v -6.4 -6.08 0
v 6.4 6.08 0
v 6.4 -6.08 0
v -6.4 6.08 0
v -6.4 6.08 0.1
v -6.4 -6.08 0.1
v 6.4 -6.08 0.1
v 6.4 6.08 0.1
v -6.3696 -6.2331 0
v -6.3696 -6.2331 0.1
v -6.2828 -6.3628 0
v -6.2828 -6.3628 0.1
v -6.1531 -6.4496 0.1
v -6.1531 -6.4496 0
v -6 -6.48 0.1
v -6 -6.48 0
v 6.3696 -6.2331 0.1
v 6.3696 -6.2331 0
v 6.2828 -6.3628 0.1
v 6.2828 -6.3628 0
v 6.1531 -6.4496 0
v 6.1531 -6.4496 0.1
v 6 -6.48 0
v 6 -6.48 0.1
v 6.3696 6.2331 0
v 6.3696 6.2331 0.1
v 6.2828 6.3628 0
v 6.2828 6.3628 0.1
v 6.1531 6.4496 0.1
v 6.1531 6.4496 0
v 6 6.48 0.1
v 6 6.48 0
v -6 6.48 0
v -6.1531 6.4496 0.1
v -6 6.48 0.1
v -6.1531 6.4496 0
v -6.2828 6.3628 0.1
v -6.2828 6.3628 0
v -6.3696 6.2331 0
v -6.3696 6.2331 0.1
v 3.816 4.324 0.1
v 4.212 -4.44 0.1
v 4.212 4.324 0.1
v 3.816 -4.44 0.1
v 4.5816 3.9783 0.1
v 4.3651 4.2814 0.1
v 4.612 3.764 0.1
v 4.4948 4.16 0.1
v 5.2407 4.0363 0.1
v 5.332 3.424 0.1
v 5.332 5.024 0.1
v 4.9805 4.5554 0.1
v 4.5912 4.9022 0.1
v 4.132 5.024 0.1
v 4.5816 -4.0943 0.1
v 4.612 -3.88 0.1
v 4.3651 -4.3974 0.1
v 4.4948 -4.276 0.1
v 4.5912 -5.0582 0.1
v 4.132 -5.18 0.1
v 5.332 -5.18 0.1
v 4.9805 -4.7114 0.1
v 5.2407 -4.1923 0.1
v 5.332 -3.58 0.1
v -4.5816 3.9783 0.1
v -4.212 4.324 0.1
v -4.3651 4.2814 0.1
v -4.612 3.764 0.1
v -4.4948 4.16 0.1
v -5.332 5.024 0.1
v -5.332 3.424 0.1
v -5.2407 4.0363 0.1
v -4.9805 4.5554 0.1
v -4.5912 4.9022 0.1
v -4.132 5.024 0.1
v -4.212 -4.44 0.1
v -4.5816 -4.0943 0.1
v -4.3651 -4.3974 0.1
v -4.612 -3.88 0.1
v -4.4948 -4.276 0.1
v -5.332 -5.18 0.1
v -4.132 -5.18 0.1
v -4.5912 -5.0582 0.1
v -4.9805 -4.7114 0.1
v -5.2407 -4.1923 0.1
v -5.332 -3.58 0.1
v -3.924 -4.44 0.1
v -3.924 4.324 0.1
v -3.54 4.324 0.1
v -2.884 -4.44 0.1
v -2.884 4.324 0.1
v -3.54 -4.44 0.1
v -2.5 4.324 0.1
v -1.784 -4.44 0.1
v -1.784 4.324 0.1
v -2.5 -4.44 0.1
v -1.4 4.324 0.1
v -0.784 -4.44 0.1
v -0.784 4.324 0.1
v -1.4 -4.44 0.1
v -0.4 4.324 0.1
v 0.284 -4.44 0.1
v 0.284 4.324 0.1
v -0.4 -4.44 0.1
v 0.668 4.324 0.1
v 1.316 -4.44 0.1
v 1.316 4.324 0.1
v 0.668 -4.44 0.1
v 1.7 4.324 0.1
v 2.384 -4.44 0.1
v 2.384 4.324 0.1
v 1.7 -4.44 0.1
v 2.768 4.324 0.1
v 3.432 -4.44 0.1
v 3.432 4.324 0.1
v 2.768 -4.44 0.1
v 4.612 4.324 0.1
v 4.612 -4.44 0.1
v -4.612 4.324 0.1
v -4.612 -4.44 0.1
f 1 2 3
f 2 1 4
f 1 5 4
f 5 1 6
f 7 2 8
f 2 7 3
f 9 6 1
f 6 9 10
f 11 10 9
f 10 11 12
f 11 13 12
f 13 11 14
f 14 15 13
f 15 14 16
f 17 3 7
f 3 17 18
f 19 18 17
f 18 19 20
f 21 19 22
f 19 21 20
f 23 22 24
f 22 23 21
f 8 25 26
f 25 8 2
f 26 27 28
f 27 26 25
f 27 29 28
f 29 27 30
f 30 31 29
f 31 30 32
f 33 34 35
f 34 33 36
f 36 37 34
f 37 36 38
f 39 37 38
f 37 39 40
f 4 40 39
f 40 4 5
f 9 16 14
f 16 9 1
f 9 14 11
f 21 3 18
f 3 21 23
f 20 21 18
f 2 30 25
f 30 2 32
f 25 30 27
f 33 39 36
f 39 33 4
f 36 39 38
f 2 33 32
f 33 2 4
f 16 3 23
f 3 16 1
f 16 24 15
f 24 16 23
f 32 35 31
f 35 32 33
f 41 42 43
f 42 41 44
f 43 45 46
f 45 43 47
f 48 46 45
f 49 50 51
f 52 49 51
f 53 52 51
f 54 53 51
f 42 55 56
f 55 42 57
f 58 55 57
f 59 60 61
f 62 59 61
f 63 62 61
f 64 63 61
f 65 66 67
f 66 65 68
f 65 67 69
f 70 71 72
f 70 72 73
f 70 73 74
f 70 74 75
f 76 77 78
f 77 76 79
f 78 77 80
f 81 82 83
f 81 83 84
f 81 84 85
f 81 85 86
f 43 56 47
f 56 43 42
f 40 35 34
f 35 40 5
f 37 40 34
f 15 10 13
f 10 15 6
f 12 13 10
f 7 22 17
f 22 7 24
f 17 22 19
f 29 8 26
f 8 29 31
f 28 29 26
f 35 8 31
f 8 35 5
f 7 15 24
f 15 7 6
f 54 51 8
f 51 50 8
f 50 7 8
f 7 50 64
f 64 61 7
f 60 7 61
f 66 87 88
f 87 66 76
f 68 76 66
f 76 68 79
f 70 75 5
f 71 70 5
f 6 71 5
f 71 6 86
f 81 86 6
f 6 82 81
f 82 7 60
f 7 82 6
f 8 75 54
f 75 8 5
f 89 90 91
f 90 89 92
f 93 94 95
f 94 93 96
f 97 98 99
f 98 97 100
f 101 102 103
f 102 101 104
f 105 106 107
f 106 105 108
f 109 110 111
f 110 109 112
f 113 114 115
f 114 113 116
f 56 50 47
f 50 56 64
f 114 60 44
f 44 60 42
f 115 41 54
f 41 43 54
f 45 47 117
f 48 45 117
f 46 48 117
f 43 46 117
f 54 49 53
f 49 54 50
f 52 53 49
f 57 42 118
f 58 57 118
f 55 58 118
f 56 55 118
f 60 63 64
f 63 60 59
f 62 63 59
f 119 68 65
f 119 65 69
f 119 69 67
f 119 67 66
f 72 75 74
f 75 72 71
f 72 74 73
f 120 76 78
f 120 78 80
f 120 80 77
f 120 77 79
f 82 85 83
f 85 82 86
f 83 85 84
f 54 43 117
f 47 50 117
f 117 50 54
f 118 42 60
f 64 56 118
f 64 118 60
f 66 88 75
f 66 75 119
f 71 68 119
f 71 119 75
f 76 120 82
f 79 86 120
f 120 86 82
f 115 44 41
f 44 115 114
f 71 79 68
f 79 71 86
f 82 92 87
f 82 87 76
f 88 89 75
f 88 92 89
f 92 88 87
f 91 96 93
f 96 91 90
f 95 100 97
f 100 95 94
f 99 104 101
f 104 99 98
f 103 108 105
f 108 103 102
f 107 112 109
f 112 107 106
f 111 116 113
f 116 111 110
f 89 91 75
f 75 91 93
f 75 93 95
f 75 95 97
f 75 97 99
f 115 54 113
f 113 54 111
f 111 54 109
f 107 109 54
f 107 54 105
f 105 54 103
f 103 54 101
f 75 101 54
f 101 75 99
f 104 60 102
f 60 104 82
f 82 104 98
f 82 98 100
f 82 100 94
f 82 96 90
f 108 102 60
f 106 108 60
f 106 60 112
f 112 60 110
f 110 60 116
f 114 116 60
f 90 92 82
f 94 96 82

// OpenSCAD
// file: ../p/box3u12.scad
use <../lib.scad>
function ldraw_lib__box3u12() = [
// 0 Box with 3 Parallel Faces without Any Edges
// 0 Name: box3u12.dat
// 0 Author: J.C. Tchang [tchang]
// 0 !LDRAW_ORG Primitive UPDATE 2014-02
// 0 !LICENSE Licensed under CC BY 2.0 and CC BY 4.0 : see CAreadme.txt
// 
// 0 BFC CERTIFY CCW
  [0,"BFC","CERTIFY"],
  [0,"BFC","CCW"],
// 
// 0 !HISTORY 2014-12-23 [PTadmin] Official Update 2014-02
// 
// 
// 4 16 -1 1 1 1 1 1 1 1 -1 -1 1 -1
  [4,16,-1,1,1,1,1,1,1,1,-1,-1,1,-1],
// 4 16 -1 1 1 -1 0 1 1 0 1 1 1 1
  [4,16,-1,1,1,-1,0,1,1,0,1,1,1,1],
// 4 16 1 1 -1 1 0 -1 -1 0 -1 -1 1 -1
  [4,16,1,1,-1,1,0,-1,-1,0,-1,-1,1,-1],
];
module ldraw_lib__box3u12(step=0, col=false, unit=2/5, alt=false, line=0.2, solid=!$preview)
    makepoly(ldraw_lib__box3u12(), step=step, col=col, unit=unit, alt=alt, line=line, solid=solid);
ldraw_lib__box3u12(line=0.2);
// file: ../p/1-4ndis.scad
use <../lib.scad>
function ldraw_lib__1_4ndis() = [
// 0 Disc Negative 0.25
// 0 Name: 1-4ndis.dat
// 0 Author: James Jessiman
// 0 !LDRAW_ORG Primitive UPDATE 2012-01
// 0 !LICENSE Licensed under CC BY 2.0 and CC BY 4.0 : see CAreadme.txt
// 
// 0 BFC CERTIFY CCW
  [0,"BFC","CERTIFY"],
  [0,"BFC","CCW"],
// 
// 0 !HISTORY 2002-03-23 [sbliss] Added BFC Statement
// 0 !HISTORY 2002-04-25 [PTadmin] Official Update 2002-02
// 0 !HISTORY 2007-06-22 [PTadmin] Header formatted for Contributor Agreement
// 0 !HISTORY 2008-07-01 [PTadmin] Official Update 2008-01
// 0 !HISTORY 2012-02-16 [Philo] Changed to CCW
// 0 !HISTORY 2012-03-30 [PTadmin] Official Update 2012-01
// 
// 
// 3 16 0.9239 0 0.3827 1 0 0 1 0 1
  [3,16,0.9239,0,0.3827,1,0,0,1,0,1],
// 3 16 0.7071 0 0.7071 0.9239 0 0.3827 1 0 1
  [3,16,0.7071,0,0.7071,0.9239,0,0.3827,1,0,1],
// 3 16 0.3827 0 0.9239 0.7071 0 0.7071 1 0 1
  [3,16,0.3827,0,0.9239,0.7071,0,0.7071,1,0,1],
// 3 16 0 0 1 0.3827 0 0.9239 1 0 1
  [3,16,0,0,1,0.3827,0,0.9239,1,0,1],
];
module ldraw_lib__1_4ndis(step=0, col=false, unit=2/5, alt=false, line=0.2, solid=!$preview)
    makepoly(ldraw_lib__1_4ndis(), step=step, col=col, unit=unit, alt=alt, line=line, solid=solid);
ldraw_lib__1_4ndis(line=0.2);
// file: ../p/1-4cyli.scad
use <../lib.scad>
function ldraw_lib__1_4cyli() = [
// 0 Cylinder 0.25
// 0 Name: 1-4cyli.dat
// 0 Author: James Jessiman
// 0 !LDRAW_ORG Primitive UPDATE 2012-01
// 0 !LICENSE Licensed under CC BY 2.0 and CC BY 4.0 : see CAreadme.txt
// 
// 0 BFC CERTIFY CCW
  [0,"BFC","CERTIFY"],
  [0,"BFC","CCW"],
// 
// 0 !HISTORY 2002-03-23 [sbliss] Added BFC statement.
// 0 !HISTORY 2002-04-25 [PTadmin] Official Update 2002-02
// 0 !HISTORY 2007-06-22 [PTadmin] Header formatted for Contributor Agreement
// 0 !HISTORY 2008-07-01 [PTadmin] Official Update 2008-01
// 0 !HISTORY 2012-02-16 [Philo] Changed to CCW
// 0 !HISTORY 2012-03-30 [PTadmin] Official Update 2012-01
// 
// 
// 4 16 1 1 0 0.9239 1 0.3827 0.9239 0 0.3827 1 0 0
  [4,16,1,1,0,0.9239,1,0.3827,0.9239,0,0.3827,1,0,0],
// 5 24 1 0 0 1 1 0 0.9239 0 0.3827 1 0 -1
  [5,24,1,0,0,1,1,0,0.9239,0,0.3827,1,0,-1],
// 4 16 0.9239 1 0.3827 0.7071 1 0.7071 0.7071 0 0.7071 0.9239 0 0.3827
  [4,16,0.9239,1,0.3827,0.7071,1,0.7071,0.7071,0,0.7071,0.9239,0,0.3827],
// 5 24 0.9239 0 0.3827 0.9239 1 0.3827 0.7071 0 0.7071 1 0 0
  [5,24,0.9239,0,0.3827,0.9239,1,0.3827,0.7071,0,0.7071,1,0,0],
// 4 16 0.7071 1 0.7071 0.3827 1 0.9239 0.3827 0 0.9239 0.7071 0 0.7071
  [4,16,0.7071,1,0.7071,0.3827,1,0.9239,0.3827,0,0.9239,0.7071,0,0.7071],
// 5 24 0.7071 0 0.7071 0.7071 1 0.7071 0.3827 0 0.9239 0.9239 0 0.3827
  [5,24,0.7071,0,0.7071,0.7071,1,0.7071,0.3827,0,0.9239,0.9239,0,0.3827],
// 4 16 0.3827 1 0.9239 0 1 1 0 0 1 0.3827 0 0.9239
  [4,16,0.3827,1,0.9239,0,1,1,0,0,1,0.3827,0,0.9239],
// 5 24 0.3827 0 0.9239 0.3827 1 0.9239 0 0 1 0.7071 0 0.7071
  [5,24,0.3827,0,0.9239,0.3827,1,0.9239,0,0,1,0.7071,0,0.7071],
// 5 24 0 0 1 0 1 1 0.3827 0 0.9239 -1 0 1
  [5,24,0,0,1,0,1,1,0.3827,0,0.9239,-1,0,1],
];
module ldraw_lib__1_4cyli(step=0, col=false, unit=2/5, alt=false, line=0.2, solid=!$preview)
    makepoly(ldraw_lib__1_4cyli(), step=step, col=col, unit=unit, alt=alt, line=line, solid=solid);
ldraw_lib__1_4cyli(line=0.2);
// file: ../p/1-4chrd.scad
use <../lib.scad>
function ldraw_lib__1_4chrd() = [
// 0 Chord 0.25
// 0 Name: 1-4chrd.dat
// 0 Author: Tony Hafner [hafhead]
// 0 !LDRAW_ORG Primitive UPDATE 2012-02
// 0 !LICENSE Licensed under CC BY 2.0 and CC BY 4.0 : see CAreadme.txt
// 
// 0 BFC CERTIFY CCW
  [0,"BFC","CERTIFY"],
  [0,"BFC","CCW"],
// 
// 0 !HISTORY 2004-04-22 [PTadmin] Official Update 2004-02
// 0 !HISTORY 2007-10-09 [PTadmin] Header formatted for Contributor Agreement
// 0 !HISTORY 2008-07-01 [PTadmin] Official Update 2008-01
// 0 !HISTORY 2012-08-02 [MMR1988] Re-creation with PrimGen2 and Rectifier
// 0 !HISTORY 2012-08-09 [PTadmin] Official Update 2012-02
// 
// 
// 4 16 0.9239 0 0.3827 0.3827 0 0.9239 0 0 1 1 0 0
  [4,16,0.9239,0,0.3827,0.3827,0,0.9239,0,0,1,1,0,0],
// 3 16 0.7071 0 0.7071 0.3827 0 0.9239 0.9239 0 0.3827
  [3,16,0.7071,0,0.7071,0.3827,0,0.9239,0.9239,0,0.3827],
];
module ldraw_lib__1_4chrd(step=0, col=false, unit=2/5, alt=false, line=0.2, solid=!$preview)
    makepoly(ldraw_lib__1_4chrd(), step=step, col=col, unit=unit, alt=alt, line=line, solid=solid);
ldraw_lib__1_4chrd(line=0.2);
// main file
use <../lib.scad>
use <../p/1-4chrd.scad>
use <../p/1-4cyli.scad>
use <../p/1-4ndis.scad>
use <../p/box3u12.scad>
function ldraw_lib__4121723o() = [
// 0 Sticker  1.6 x  1.6 with Black Grille and Transparent Background
// 0 Name: 4121723o.dat
// 0 Author: Ulrich Röder [UR]
// 0 !LDRAW_ORG Part UPDATE 2022-06
// 0 !LICENSE Licensed under CC BY 2.0 and CC BY 4.0 : see CAreadme.txt
// 
// 0 BFC CERTIFY CCW
  [0,"BFC","CERTIFY"],
  [0,"BFC","CCW"],
// 
// 0 !KEYWORDS Model Team, Racing Truck, Set 5563
// 
// 0 !HISTORY 2022-12-20 [PTadmin] Official Update 2022-06
// 
// 
// 0 // Body
// 
// 1 16 0 -.25 0 0 0 -16. 0 .25 0 15.2 0 0 box3u12.dat
  [1,16,0,-.25,0,0,0,-16.,0,.25,0,15.2,0,0, ldraw_lib__box3u12()],
// 1 16 -15 0 -15.2 -1 0 0 0 -.25 0 0 0 -1 1-4cyli.dat
  [1,16,-15,0,-15.2,-1,0,0,0,-.25,0,0,0,-1, ldraw_lib__1_4cyli()],
// 1 16 15 0 -15.2 1 0 0 0 -.25 0 0 0 -1 1-4cyli.dat
  [1,16,15,0,-15.2,1,0,0,0,-.25,0,0,0,-1, ldraw_lib__1_4cyli()],
// 1 16 15 0 15.2 1 0 0 0 -.25 0 0 0 1 1-4cyli.dat
  [1,16,15,0,15.2,1,0,0,0,-.25,0,0,0,1, ldraw_lib__1_4cyli()],
// 1 16 -15 0 15.2 0 0 -1 0 -.25 0 1 0 0 1-4cyli.dat
  [1,16,-15,0,15.2,0,0,-1,0,-.25,0,1,0,0, ldraw_lib__1_4cyli()],
// 1 16 -15 0 -15.2 -1 0 0 0 -1 0 0 0 -1 1-4chrd.dat
  [1,16,-15,0,-15.2,-1,0,0,0,-1,0,0,0,-1, ldraw_lib__1_4chrd()],
// 1 16 15 0 -15.2 1 0 0 0 -1 0 0 0 -1 1-4chrd.dat
  [1,16,15,0,-15.2,1,0,0,0,-1,0,0,0,-1, ldraw_lib__1_4chrd()],
// 1 16 15 0 15.2 1 0 0 0 -1 0 0 0 1 1-4chrd.dat
  [1,16,15,0,15.2,1,0,0,0,-1,0,0,0,1, ldraw_lib__1_4chrd()],
// 1 16 -15 0 15.2 0 0 -1 0 -1 0 1 0 0 1-4chrd.dat
  [1,16,-15,0,15.2,0,0,-1,0,-1,0,1,0,0, ldraw_lib__1_4chrd()],
// 4 16 -16 0 15.2 -15 0 16.2 15 0 16.2 16 0 15.2
  [4,16,-16,0,15.2,-15,0,16.2,15,0,16.2,16,0,15.2],
// 4 16 16 0 -15.2 15 0 -16.2 -15 0 -16.2 -16 0 -15.2
  [4,16,16,0,-15.2,15,0,-16.2,-15,0,-16.2,-16,0,-15.2],
// 4 16 -15 -.25 -16.2 -15 0 -16.2 15 0 -16.2 15 -.25 -16.2
  [4,16,-15,-.25,-16.2,-15,0,-16.2,15,0,-16.2,15,-.25,-16.2],
// 4 16 15 0 16.2 -15 0 16.2 -15 -.25 16.2 15 -.25 16.2
  [4,16,15,0,16.2,-15,0,16.2,-15,-.25,16.2,15,-.25,16.2],
// 
// 0 // Frontface
// 4 16 9.54 -.25 -11.1 10.53 -.25 -11.1 10.53 -.25 10.81 9.54 -.25 10.81
  [4,16,9.54,-.25,-11.1,10.53,-.25,-11.1,10.53,-.25,10.81,9.54,-.25,10.81],
// 1 16 10.53 -.25 9.41 1 0 0 0 1 0 0 0 1.4 1-4chrd.dat
  [1,16,10.53,-.25,9.41,1,0,0,0,1,0,0,0,1.4, ldraw_lib__1_4chrd()],
// 1 16 10.33 -.25 8.56 3 0 0 0 1 0 0 0 4 1-4ndis.dat
  [1,16,10.33,-.25,8.56,3,0,0,0,1,0,0,0,4, ldraw_lib__1_4ndis()],
// 1 16 10.53 -.25 -9.7 0 0 1 0 1 0 -1.4 0 0 1-4chrd.dat
  [1,16,10.53,-.25,-9.7,0,0,1,0,1,0,-1.4,0,0, ldraw_lib__1_4chrd()],
// 1 16 10.33 -.25 -8.95 0 0 3 0 1 0 -4 0 0 1-4ndis.dat
  [1,16,10.33,-.25,-8.95,0,0,3,0,1,0,-4,0,0, ldraw_lib__1_4ndis()],
// 1 16 -10.53 -.25 9.41 -1 0 0 0 1 0 0 0 1.4 1-4chrd.dat
  [1,16,-10.53,-.25,9.41,-1,0,0,0,1,0,0,0,1.4, ldraw_lib__1_4chrd()],
// 1 16 -10.33 -.25 8.56 -3 0 0 0 1 0 0 0 4 1-4ndis.dat
  [1,16,-10.33,-.25,8.56,-3,0,0,0,1,0,0,0,4, ldraw_lib__1_4ndis()],
// 1 16 -10.53 -.25 -9.7 0 0 -1 0 1 0 -1.4 0 0 1-4chrd.dat
  [1,16,-10.53,-.25,-9.7,0,0,-1,0,1,0,-1.4,0,0, ldraw_lib__1_4chrd()],
// 1 16 -10.33 -.25 -8.95 0 0 -3 0 1 0 -4 0 0 1-4ndis.dat
  [1,16,-10.33,-.25,-8.95,0,0,-3,0,1,0,-4,0,0, ldraw_lib__1_4ndis()],
// 4 16 10.53 -.25 -11.1 11.53 -.25 -9.7 11.53 -.25 9.41 10.53 -.25 10.81
  [4,16,10.53,-.25,-11.1,11.53,-.25,-9.7,11.53,-.25,9.41,10.53,-.25,10.81],
// 1 16 -15 -.25 15.2 0 0 -1 0 1 0 1 0 0 1-4chrd.dat
  [1,16,-15,-.25,15.2,0,0,-1,0,1,0,1,0,0, ldraw_lib__1_4chrd()],
// 1 16 -15 -.25 -15.2 -1 0 0 0 1 0 0 0 -1 1-4chrd.dat
  [1,16,-15,-.25,-15.2,-1,0,0,0,1,0,0,0,-1, ldraw_lib__1_4chrd()],
// 1 16 15 -.25 -15.2 1 0 0 0 1 0 0 0 -1 1-4chrd.dat
  [1,16,15,-.25,-15.2,1,0,0,0,1,0,0,0,-1, ldraw_lib__1_4chrd()],
// 1 16 15 -.25 15.2 1 0 0 0 1 0 0 0 1 1-4chrd.dat
  [1,16,15,-.25,15.2,1,0,0,0,1,0,0,0,1, ldraw_lib__1_4chrd()],
// 4 16 15 -.25 16.2 -15 -.25 16.2 -16 -.25 15.2 16 -.25 15.2
  [4,16,15,-.25,16.2,-15,-.25,16.2,-16,-.25,15.2,16,-.25,15.2],
// 4 16 -15 -.25 -16.2 15 -.25 -16.2 16 -.25 -15.2 -16 -.25 -15.2
  [4,16,-15,-.25,-16.2,15,-.25,-16.2,16,-.25,-15.2,-16,-.25,-15.2],
// 3 16 10.33 -.25 12.56 13.33 -.25 12.56 16 -.25 15.2
  [3,16,10.33,-.25,12.56,13.33,-.25,12.56,16,-.25,15.2],
// 3 16 13.33 -.25 12.56 13.33 -.25 8.56 16 -.25 15.2
  [3,16,13.33,-.25,12.56,13.33,-.25,8.56,16,-.25,15.2],
// 4 16 16 -.25 15.2 13.33 -.25 8.56 13.33 -.25 -8.95 16 -.25 -15.2
  [4,16,16,-.25,15.2,13.33,-.25,8.56,13.33,-.25,-8.95,16,-.25,-15.2],
// 3 16 13.33 -.25 -8.95 13.33 -.25 -12.95 16 -.25 -15.2
  [3,16,13.33,-.25,-8.95,13.33,-.25,-12.95,16,-.25,-15.2],
// 3 16 10.33 -.25 -12.95 16 -.25 -15.2 13.33 -.25 -12.95
  [3,16,10.33,-.25,-12.95,16,-.25,-15.2,13.33,-.25,-12.95],
// 4 16 -10.53 -.25 10.81 -10.53 -.25 -11.1 -9.81 -.25 -11.1 -9.81 -.25 10.81
  [4,16,-10.53,-.25,10.81,-10.53,-.25,-11.1,-9.81,-.25,-11.1,-9.81,-.25,10.81],
// 4 16 -11.53 -.25 9.41 -11.53 -.25 -9.7 -10.53 -.25 -11.1 -10.53 -.25 10.81
  [4,16,-11.53,-.25,9.41,-11.53,-.25,-9.7,-10.53,-.25,-11.1,-10.53,-.25,10.81],
// 3 16 -13.33 -.25 12.56 -10.33 -.25 12.56 -16 -.25 15.2
  [3,16,-13.33,-.25,12.56,-10.33,-.25,12.56,-16,-.25,15.2],
// 3 16 -13.33 -.25 8.56 -13.33 -.25 12.56 -16 -.25 15.2
  [3,16,-13.33,-.25,8.56,-13.33,-.25,12.56,-16,-.25,15.2],
// 4 16 -13.33 -.25 -8.95 -13.33 -.25 8.56 -16 -.25 15.2 -16 -.25 -15.2
  [4,16,-13.33,-.25,-8.95,-13.33,-.25,8.56,-16,-.25,15.2,-16,-.25,-15.2],
// 3 16 -13.33 -.25 -12.95 -13.33 -.25 -8.95 -16 -.25 -15.2
  [3,16,-13.33,-.25,-12.95,-13.33,-.25,-8.95,-16,-.25,-15.2],
// 3 16 -16 -.25 -15.2 -10.33 -.25 -12.95 -13.33 -.25 -12.95
  [3,16,-16,-.25,-15.2,-10.33,-.25,-12.95,-13.33,-.25,-12.95],
// 4 16 10.33 -.25 -12.95 -10.33 -.25 -12.95 -16 -.25 -15.2 16 -.25 -15.2
  [4,16,10.33,-.25,-12.95,-10.33,-.25,-12.95,-16,-.25,-15.2,16,-.25,-15.2],
// 4 16 -10.33 -.25 12.56 10.33 -.25 12.56 16 -.25 15.2 -16 -.25 15.2
  [4,16,-10.33,-.25,12.56,10.33,-.25,12.56,16,-.25,15.2,-16,-.25,15.2],
// 4 16 -7.21 -.25 10.81 -8.85 -.25 10.81 -8.85 -.25 -11.1 -7.21 -.25 -11.1
  [4,16,-7.21,-.25,10.81,-8.85,-.25,10.81,-8.85,-.25,-11.1,-7.21,-.25,-11.1],
// 4 16 -4.46 -.25 10.81 -6.25 -.25 10.81 -6.25 -.25 -11.1 -4.46 -.25 -11.1
  [4,16,-4.46,-.25,10.81,-6.25,-.25,10.81,-6.25,-.25,-11.1,-4.46,-.25,-11.1],
// 4 16 -1.96 -.25 10.81 -3.5 -.25 10.81 -3.5 -.25 -11.1 -1.96 -.25 -11.1
  [4,16,-1.96,-.25,10.81,-3.5,-.25,10.81,-3.5,-.25,-11.1,-1.96,-.25,-11.1],
// 4 16 .71 -.25 10.81 -1 -.25 10.81 -1 -.25 -11.1 .71 -.25 -11.1
  [4,16,.71,-.25,10.81,-1,-.25,10.81,-1,-.25,-11.1,.71,-.25,-11.1],
// 4 16 3.29 -.25 10.81 1.67 -.25 10.81 1.67 -.25 -11.1 3.29 -.25 -11.1
  [4,16,3.29,-.25,10.81,1.67,-.25,10.81,1.67,-.25,-11.1,3.29,-.25,-11.1],
// 4 16 5.96 -.25 10.81 4.25 -.25 10.81 4.25 -.25 -11.1 5.96 -.25 -11.1
  [4,16,5.96,-.25,10.81,4.25,-.25,10.81,4.25,-.25,-11.1,5.96,-.25,-11.1],
// 4 16 8.58 -.25 10.81 6.92 -.25 10.81 6.92 -.25 -11.1 8.58 -.25 -11.1
  [4,16,8.58,-.25,10.81,6.92,-.25,10.81,6.92,-.25,-11.1,8.58,-.25,-11.1],
// 
// 0 // Grill
// 0 BFC NOCLIP
  [0,"BFC","NOCLIP"],
// 4 0 11.53 -.25 9.41 11.53 -.25 -9.7 13.33 -.25 -8.95 13.33 -.25 8.56
  [4,0,11.53,-.25,9.41,11.53,-.25,-9.7,13.33,-.25,-8.95,13.33,-.25,8.56],
// 3 0 8.58 -.25 -11.1 10.33 -.25 -12.95 9.54 -.25 -11.1
  [3,0,8.58,-.25,-11.1,10.33,-.25,-12.95,9.54,-.25,-11.1],
// 3 0 9.54 -.25 -11.1 10.33 -.25 -12.95 10.53 -.25 -11.1
  [3,0,9.54,-.25,-11.1,10.33,-.25,-12.95,10.53,-.25,-11.1],
// 3 0 8.58 -.25 10.81 9.54 -.25 10.81 10.33 -.25 12.56
  [3,0,8.58,-.25,10.81,9.54,-.25,10.81,10.33,-.25,12.56],
// 3 0 9.54 -.25 10.81 10.53 -.25 10.81 10.33 -.25 12.56
  [3,0,9.54,-.25,10.81,10.53,-.25,10.81,10.33,-.25,12.56],
// 1 0 10.53 -.25 9.41 1 0 0 0 1 0 0 0 1.4 1-4ndis.dat
  [1,0,10.53,-.25,9.41,1,0,0,0,1,0,0,0,1.4, ldraw_lib__1_4ndis()],
// 1 0 10.33 -.25 8.56 3 0 0 0 1 0 0 0 4 1-4chrd.dat
  [1,0,10.33,-.25,8.56,3,0,0,0,1,0,0,0,4, ldraw_lib__1_4chrd()],
// 1 0 10.53 -.25 -9.7 0 0 1 0 1 0 -1.4 0 0 1-4ndis.dat
  [1,0,10.53,-.25,-9.7,0,0,1,0,1,0,-1.4,0,0, ldraw_lib__1_4ndis()],
// 1 0 10.33 -.25 -8.95 0 0 3 0 1 0 -4 0 0 1-4chrd.dat
  [1,0,10.33,-.25,-8.95,0,0,3,0,1,0,-4,0,0, ldraw_lib__1_4chrd()],
// 1 0 -10.53 -.25 9.41 -1 0 0 0 1 0 0 0 1.4 1-4ndis.dat
  [1,0,-10.53,-.25,9.41,-1,0,0,0,1,0,0,0,1.4, ldraw_lib__1_4ndis()],
// 1 0 -10.33 -.25 8.56 -3 0 0 0 1 0 0 0 4 1-4chrd.dat
  [1,0,-10.33,-.25,8.56,-3,0,0,0,1,0,0,0,4, ldraw_lib__1_4chrd()],
// 1 0 -10.53 -.25 -9.7 0 0 -1 0 1 0 -1.4 0 0 1-4ndis.dat
  [1,0,-10.53,-.25,-9.7,0,0,-1,0,1,0,-1.4,0,0, ldraw_lib__1_4ndis()],
// 1 0 -10.33 -.25 -8.95 0 0 -3 0 1 0 -4 0 0 1-4chrd.dat
  [1,0,-10.33,-.25,-8.95,0,0,-3,0,1,0,-4,0,0, ldraw_lib__1_4chrd()],
// 3 0 10.33 -.25 12.56 10.53 -.25 10.81 11.53 -.25 10.81
  [3,0,10.33,-.25,12.56,10.53,-.25,10.81,11.53,-.25,10.81],
// 3 0 11.53 -.25 9.41 13.33 -.25 8.56 11.53 -.25 10.81
  [3,0,11.53,-.25,9.41,13.33,-.25,8.56,11.53,-.25,10.81],
// 3 0 11.53 -.25 10.81 13.33 -.25 8.56 10.33 -.25 12.56
  [3,0,11.53,-.25,10.81,13.33,-.25,8.56,10.33,-.25,12.56],
// 3 0 11.53 -.25 -11.1 10.53 -.25 -11.1 10.33 -.25 -12.95
  [3,0,11.53,-.25,-11.1,10.53,-.25,-11.1,10.33,-.25,-12.95],
// 3 0 13.33 -.25 -8.95 11.53 -.25 -9.7 11.53 -.25 -11.1
  [3,0,13.33,-.25,-8.95,11.53,-.25,-9.7,11.53,-.25,-11.1],
// 3 0 13.33 -.25 -8.95 11.53 -.25 -11.1 10.33 -.25 -12.95
  [3,0,13.33,-.25,-8.95,11.53,-.25,-11.1,10.33,-.25,-12.95],
// 3 0 -10.53 -.25 10.81 -9.81 -.25 10.81 -10.33 -.25 12.56
  [3,0,-10.53,-.25,10.81,-9.81,-.25,10.81,-10.33,-.25,12.56],
// 3 0 -10.53 -.25 10.81 -10.33 -.25 12.56 -11.53 -.25 10.81
  [3,0,-10.53,-.25,10.81,-10.33,-.25,12.56,-11.53,-.25,10.81],
// 3 0 -13.33 -.25 8.56 -11.53 -.25 9.41 -11.53 -.25 10.81
  [3,0,-13.33,-.25,8.56,-11.53,-.25,9.41,-11.53,-.25,10.81],
// 3 0 -13.33 -.25 8.56 -11.53 -.25 10.81 -10.33 -.25 12.56
  [3,0,-13.33,-.25,8.56,-11.53,-.25,10.81,-10.33,-.25,12.56],
// 3 0 -10.53 -.25 -11.1 -11.53 -.25 -11.1 -10.33 -.25 -12.95
  [3,0,-10.53,-.25,-11.1,-11.53,-.25,-11.1,-10.33,-.25,-12.95],
// 3 0 -11.53 -.25 -9.7 -13.33 -.25 -8.95 -11.53 -.25 -11.1
  [3,0,-11.53,-.25,-9.7,-13.33,-.25,-8.95,-11.53,-.25,-11.1],
// 3 0 -11.53 -.25 -11.1 -13.33 -.25 -8.95 -10.33 -.25 -12.95
  [3,0,-11.53,-.25,-11.1,-13.33,-.25,-8.95,-10.33,-.25,-12.95],
// 4 0 8.58 -.25 10.81 8.58 -.25 -11.1 9.54 -.25 -11.1 9.54 -.25 10.81
  [4,0,8.58,-.25,10.81,8.58,-.25,-11.1,9.54,-.25,-11.1,9.54,-.25,10.81],
// 4 0 -13.33 -.25 -8.95 -11.53 -.25 -9.7 -11.53 -.25 9.41 -13.33 -.25 8.56
  [4,0,-13.33,-.25,-8.95,-11.53,-.25,-9.7,-11.53,-.25,9.41,-13.33,-.25,8.56],
// 3 0 -10.33 -.25 -12.95 -8.85 -.25 -11.1 -9.81 -.25 -11.1
  [3,0,-10.33,-.25,-12.95,-8.85,-.25,-11.1,-9.81,-.25,-11.1],
// 3 0 -10.33 -.25 -12.95 -9.81 -.25 -11.1 -10.53 -.25 -11.1
  [3,0,-10.33,-.25,-12.95,-9.81,-.25,-11.1,-10.53,-.25,-11.1],
// 3 0 -9.81 -.25 10.81 -8.85 -.25 10.81 -10.33 -.25 12.56
  [3,0,-9.81,-.25,10.81,-8.85,-.25,10.81,-10.33,-.25,12.56],
// 4 0 -9.81 -.25 -11.1 -8.85 -.25 -11.1 -8.85 -.25 10.81 -9.81 -.25 10.81
  [4,0,-9.81,-.25,-11.1,-8.85,-.25,-11.1,-8.85,-.25,10.81,-9.81,-.25,10.81],
// 4 0 -7.21 -.25 -11.1 -6.25 -.25 -11.1 -6.25 -.25 10.81 -7.21 -.25 10.81
  [4,0,-7.21,-.25,-11.1,-6.25,-.25,-11.1,-6.25,-.25,10.81,-7.21,-.25,10.81],
// 4 0 -4.46 -.25 -11.1 -3.5 -.25 -11.1 -3.5 -.25 10.81 -4.46 -.25 10.81
  [4,0,-4.46,-.25,-11.1,-3.5,-.25,-11.1,-3.5,-.25,10.81,-4.46,-.25,10.81],
// 4 0 -1.96 -.25 -11.1 -1 -.25 -11.1 -1 -.25 10.81 -1.96 -.25 10.81
  [4,0,-1.96,-.25,-11.1,-1,-.25,-11.1,-1,-.25,10.81,-1.96,-.25,10.81],
// 4 0 .71 -.25 -11.1 1.67 -.25 -11.1 1.67 -.25 10.81 .71 -.25 10.81
  [4,0,.71,-.25,-11.1,1.67,-.25,-11.1,1.67,-.25,10.81,.71,-.25,10.81],
// 4 0 3.29 -.25 -11.1 4.25 -.25 -11.1 4.25 -.25 10.81 3.29 -.25 10.81
  [4,0,3.29,-.25,-11.1,4.25,-.25,-11.1,4.25,-.25,10.81,3.29,-.25,10.81],
// 4 0 5.96 -.25 -11.1 6.92 -.25 -11.1 6.92 -.25 10.81 5.96 -.25 10.81
  [4,0,5.96,-.25,-11.1,6.92,-.25,-11.1,6.92,-.25,10.81,5.96,-.25,10.81],
// 3 0 -8.85 -.25 10.81 -7.21 -.25 10.81 -10.33 -.25 12.56
  [3,0,-8.85,-.25,10.81,-7.21,-.25,10.81,-10.33,-.25,12.56],
// 3 0 -10.33 -.25 12.56 -7.21 -.25 10.81 -6.25 -.25 10.81
  [3,0,-10.33,-.25,12.56,-7.21,-.25,10.81,-6.25,-.25,10.81],
// 3 0 -10.33 -.25 12.56 -6.25 -.25 10.81 -4.46 -.25 10.81
  [3,0,-10.33,-.25,12.56,-6.25,-.25,10.81,-4.46,-.25,10.81],
// 3 0 -10.33 -.25 12.56 -4.46 -.25 10.81 -3.5 -.25 10.81
  [3,0,-10.33,-.25,12.56,-4.46,-.25,10.81,-3.5,-.25,10.81],
// 3 0 -10.33 -.25 12.56 -3.5 -.25 10.81 -1.96 -.25 10.81
  [3,0,-10.33,-.25,12.56,-3.5,-.25,10.81,-1.96,-.25,10.81],
// 3 0 8.58 -.25 10.81 10.33 -.25 12.56 6.92 -.25 10.81
  [3,0,8.58,-.25,10.81,10.33,-.25,12.56,6.92,-.25,10.81],
// 3 0 6.92 -.25 10.81 10.33 -.25 12.56 5.96 -.25 10.81
  [3,0,6.92,-.25,10.81,10.33,-.25,12.56,5.96,-.25,10.81],
// 3 0 5.96 -.25 10.81 10.33 -.25 12.56 4.25 -.25 10.81
  [3,0,5.96,-.25,10.81,10.33,-.25,12.56,4.25,-.25,10.81],
// 3 0 3.29 -.25 10.81 4.25 -.25 10.81 10.33 -.25 12.56
  [3,0,3.29,-.25,10.81,4.25,-.25,10.81,10.33,-.25,12.56],
// 3 0 3.29 -.25 10.81 10.33 -.25 12.56 1.67 -.25 10.81
  [3,0,3.29,-.25,10.81,10.33,-.25,12.56,1.67,-.25,10.81],
// 3 0 1.67 -.25 10.81 10.33 -.25 12.56 .71 -.25 10.81
  [3,0,1.67,-.25,10.81,10.33,-.25,12.56,.71,-.25,10.81],
// 3 0 .71 -.25 10.81 10.33 -.25 12.56 -1 -.25 10.81
  [3,0,.71,-.25,10.81,10.33,-.25,12.56,-1,-.25,10.81],
// 4 0 -1.96 -.25 10.81 -1 -.25 10.81 10.33 -.25 12.56 -10.33 -.25 12.56
  [4,0,-1.96,-.25,10.81,-1,-.25,10.81,10.33,-.25,12.56,-10.33,-.25,12.56],
// 4 0 10.33 -.25 -12.95 .71 -.25 -11.1 -1 -.25 -11.1 -10.33 -.25 -12.95
  [4,0,10.33,-.25,-12.95,.71,-.25,-11.1,-1,-.25,-11.1,-10.33,-.25,-12.95],
// 3 0 -10.33 -.25 -12.95 -1 -.25 -11.1 -1.96 -.25 -11.1
  [3,0,-10.33,-.25,-12.95,-1,-.25,-11.1,-1.96,-.25,-11.1],
// 3 0 -10.33 -.25 -12.95 -1.96 -.25 -11.1 -3.5 -.25 -11.1
  [3,0,-10.33,-.25,-12.95,-1.96,-.25,-11.1,-3.5,-.25,-11.1],
// 3 0 -10.33 -.25 -12.95 -3.5 -.25 -11.1 -4.46 -.25 -11.1
  [3,0,-10.33,-.25,-12.95,-3.5,-.25,-11.1,-4.46,-.25,-11.1],
// 3 0 -10.33 -.25 -12.95 -6.25 -.25 -11.1 -7.21 -.25 -11.1
  [3,0,-10.33,-.25,-12.95,-6.25,-.25,-11.1,-7.21,-.25,-11.1],
// 3 0 1.67 -.25 -11.1 .71 -.25 -11.1 10.33 -.25 -12.95
  [3,0,1.67,-.25,-11.1,.71,-.25,-11.1,10.33,-.25,-12.95],
// 3 0 3.29 -.25 -11.1 1.67 -.25 -11.1 10.33 -.25 -12.95
  [3,0,3.29,-.25,-11.1,1.67,-.25,-11.1,10.33,-.25,-12.95],
// 3 0 3.29 -.25 -11.1 10.33 -.25 -12.95 4.25 -.25 -11.1
  [3,0,3.29,-.25,-11.1,10.33,-.25,-12.95,4.25,-.25,-11.1],
// 3 0 4.25 -.25 -11.1 10.33 -.25 -12.95 5.96 -.25 -11.1
  [3,0,4.25,-.25,-11.1,10.33,-.25,-12.95,5.96,-.25,-11.1],
// 3 0 5.96 -.25 -11.1 10.33 -.25 -12.95 6.92 -.25 -11.1
  [3,0,5.96,-.25,-11.1,10.33,-.25,-12.95,6.92,-.25,-11.1],
// 3 0 8.58 -.25 -11.1 6.92 -.25 -11.1 10.33 -.25 -12.95
  [3,0,8.58,-.25,-11.1,6.92,-.25,-11.1,10.33,-.25,-12.95],
// 3 0 -7.21 -.25 -11.1 -8.85 -.25 -11.1 -10.33 -.25 -12.95
  [3,0,-7.21,-.25,-11.1,-8.85,-.25,-11.1,-10.33,-.25,-12.95],
// 3 0 -4.46 -.25 -11.1 -6.25 -.25 -11.1 -10.33 -.25 -12.95
  [3,0,-4.46,-.25,-11.1,-6.25,-.25,-11.1,-10.33,-.25,-12.95],
];
module ldraw_lib__4121723o(step=0, col=false, unit=2/5, alt=false, line=0.2, solid=!$preview)
    makepoly(ldraw_lib__4121723o(), step=step, col=col, unit=unit, alt=alt, line=line, solid=solid);
ldraw_lib__4121723o(line=0.2);
